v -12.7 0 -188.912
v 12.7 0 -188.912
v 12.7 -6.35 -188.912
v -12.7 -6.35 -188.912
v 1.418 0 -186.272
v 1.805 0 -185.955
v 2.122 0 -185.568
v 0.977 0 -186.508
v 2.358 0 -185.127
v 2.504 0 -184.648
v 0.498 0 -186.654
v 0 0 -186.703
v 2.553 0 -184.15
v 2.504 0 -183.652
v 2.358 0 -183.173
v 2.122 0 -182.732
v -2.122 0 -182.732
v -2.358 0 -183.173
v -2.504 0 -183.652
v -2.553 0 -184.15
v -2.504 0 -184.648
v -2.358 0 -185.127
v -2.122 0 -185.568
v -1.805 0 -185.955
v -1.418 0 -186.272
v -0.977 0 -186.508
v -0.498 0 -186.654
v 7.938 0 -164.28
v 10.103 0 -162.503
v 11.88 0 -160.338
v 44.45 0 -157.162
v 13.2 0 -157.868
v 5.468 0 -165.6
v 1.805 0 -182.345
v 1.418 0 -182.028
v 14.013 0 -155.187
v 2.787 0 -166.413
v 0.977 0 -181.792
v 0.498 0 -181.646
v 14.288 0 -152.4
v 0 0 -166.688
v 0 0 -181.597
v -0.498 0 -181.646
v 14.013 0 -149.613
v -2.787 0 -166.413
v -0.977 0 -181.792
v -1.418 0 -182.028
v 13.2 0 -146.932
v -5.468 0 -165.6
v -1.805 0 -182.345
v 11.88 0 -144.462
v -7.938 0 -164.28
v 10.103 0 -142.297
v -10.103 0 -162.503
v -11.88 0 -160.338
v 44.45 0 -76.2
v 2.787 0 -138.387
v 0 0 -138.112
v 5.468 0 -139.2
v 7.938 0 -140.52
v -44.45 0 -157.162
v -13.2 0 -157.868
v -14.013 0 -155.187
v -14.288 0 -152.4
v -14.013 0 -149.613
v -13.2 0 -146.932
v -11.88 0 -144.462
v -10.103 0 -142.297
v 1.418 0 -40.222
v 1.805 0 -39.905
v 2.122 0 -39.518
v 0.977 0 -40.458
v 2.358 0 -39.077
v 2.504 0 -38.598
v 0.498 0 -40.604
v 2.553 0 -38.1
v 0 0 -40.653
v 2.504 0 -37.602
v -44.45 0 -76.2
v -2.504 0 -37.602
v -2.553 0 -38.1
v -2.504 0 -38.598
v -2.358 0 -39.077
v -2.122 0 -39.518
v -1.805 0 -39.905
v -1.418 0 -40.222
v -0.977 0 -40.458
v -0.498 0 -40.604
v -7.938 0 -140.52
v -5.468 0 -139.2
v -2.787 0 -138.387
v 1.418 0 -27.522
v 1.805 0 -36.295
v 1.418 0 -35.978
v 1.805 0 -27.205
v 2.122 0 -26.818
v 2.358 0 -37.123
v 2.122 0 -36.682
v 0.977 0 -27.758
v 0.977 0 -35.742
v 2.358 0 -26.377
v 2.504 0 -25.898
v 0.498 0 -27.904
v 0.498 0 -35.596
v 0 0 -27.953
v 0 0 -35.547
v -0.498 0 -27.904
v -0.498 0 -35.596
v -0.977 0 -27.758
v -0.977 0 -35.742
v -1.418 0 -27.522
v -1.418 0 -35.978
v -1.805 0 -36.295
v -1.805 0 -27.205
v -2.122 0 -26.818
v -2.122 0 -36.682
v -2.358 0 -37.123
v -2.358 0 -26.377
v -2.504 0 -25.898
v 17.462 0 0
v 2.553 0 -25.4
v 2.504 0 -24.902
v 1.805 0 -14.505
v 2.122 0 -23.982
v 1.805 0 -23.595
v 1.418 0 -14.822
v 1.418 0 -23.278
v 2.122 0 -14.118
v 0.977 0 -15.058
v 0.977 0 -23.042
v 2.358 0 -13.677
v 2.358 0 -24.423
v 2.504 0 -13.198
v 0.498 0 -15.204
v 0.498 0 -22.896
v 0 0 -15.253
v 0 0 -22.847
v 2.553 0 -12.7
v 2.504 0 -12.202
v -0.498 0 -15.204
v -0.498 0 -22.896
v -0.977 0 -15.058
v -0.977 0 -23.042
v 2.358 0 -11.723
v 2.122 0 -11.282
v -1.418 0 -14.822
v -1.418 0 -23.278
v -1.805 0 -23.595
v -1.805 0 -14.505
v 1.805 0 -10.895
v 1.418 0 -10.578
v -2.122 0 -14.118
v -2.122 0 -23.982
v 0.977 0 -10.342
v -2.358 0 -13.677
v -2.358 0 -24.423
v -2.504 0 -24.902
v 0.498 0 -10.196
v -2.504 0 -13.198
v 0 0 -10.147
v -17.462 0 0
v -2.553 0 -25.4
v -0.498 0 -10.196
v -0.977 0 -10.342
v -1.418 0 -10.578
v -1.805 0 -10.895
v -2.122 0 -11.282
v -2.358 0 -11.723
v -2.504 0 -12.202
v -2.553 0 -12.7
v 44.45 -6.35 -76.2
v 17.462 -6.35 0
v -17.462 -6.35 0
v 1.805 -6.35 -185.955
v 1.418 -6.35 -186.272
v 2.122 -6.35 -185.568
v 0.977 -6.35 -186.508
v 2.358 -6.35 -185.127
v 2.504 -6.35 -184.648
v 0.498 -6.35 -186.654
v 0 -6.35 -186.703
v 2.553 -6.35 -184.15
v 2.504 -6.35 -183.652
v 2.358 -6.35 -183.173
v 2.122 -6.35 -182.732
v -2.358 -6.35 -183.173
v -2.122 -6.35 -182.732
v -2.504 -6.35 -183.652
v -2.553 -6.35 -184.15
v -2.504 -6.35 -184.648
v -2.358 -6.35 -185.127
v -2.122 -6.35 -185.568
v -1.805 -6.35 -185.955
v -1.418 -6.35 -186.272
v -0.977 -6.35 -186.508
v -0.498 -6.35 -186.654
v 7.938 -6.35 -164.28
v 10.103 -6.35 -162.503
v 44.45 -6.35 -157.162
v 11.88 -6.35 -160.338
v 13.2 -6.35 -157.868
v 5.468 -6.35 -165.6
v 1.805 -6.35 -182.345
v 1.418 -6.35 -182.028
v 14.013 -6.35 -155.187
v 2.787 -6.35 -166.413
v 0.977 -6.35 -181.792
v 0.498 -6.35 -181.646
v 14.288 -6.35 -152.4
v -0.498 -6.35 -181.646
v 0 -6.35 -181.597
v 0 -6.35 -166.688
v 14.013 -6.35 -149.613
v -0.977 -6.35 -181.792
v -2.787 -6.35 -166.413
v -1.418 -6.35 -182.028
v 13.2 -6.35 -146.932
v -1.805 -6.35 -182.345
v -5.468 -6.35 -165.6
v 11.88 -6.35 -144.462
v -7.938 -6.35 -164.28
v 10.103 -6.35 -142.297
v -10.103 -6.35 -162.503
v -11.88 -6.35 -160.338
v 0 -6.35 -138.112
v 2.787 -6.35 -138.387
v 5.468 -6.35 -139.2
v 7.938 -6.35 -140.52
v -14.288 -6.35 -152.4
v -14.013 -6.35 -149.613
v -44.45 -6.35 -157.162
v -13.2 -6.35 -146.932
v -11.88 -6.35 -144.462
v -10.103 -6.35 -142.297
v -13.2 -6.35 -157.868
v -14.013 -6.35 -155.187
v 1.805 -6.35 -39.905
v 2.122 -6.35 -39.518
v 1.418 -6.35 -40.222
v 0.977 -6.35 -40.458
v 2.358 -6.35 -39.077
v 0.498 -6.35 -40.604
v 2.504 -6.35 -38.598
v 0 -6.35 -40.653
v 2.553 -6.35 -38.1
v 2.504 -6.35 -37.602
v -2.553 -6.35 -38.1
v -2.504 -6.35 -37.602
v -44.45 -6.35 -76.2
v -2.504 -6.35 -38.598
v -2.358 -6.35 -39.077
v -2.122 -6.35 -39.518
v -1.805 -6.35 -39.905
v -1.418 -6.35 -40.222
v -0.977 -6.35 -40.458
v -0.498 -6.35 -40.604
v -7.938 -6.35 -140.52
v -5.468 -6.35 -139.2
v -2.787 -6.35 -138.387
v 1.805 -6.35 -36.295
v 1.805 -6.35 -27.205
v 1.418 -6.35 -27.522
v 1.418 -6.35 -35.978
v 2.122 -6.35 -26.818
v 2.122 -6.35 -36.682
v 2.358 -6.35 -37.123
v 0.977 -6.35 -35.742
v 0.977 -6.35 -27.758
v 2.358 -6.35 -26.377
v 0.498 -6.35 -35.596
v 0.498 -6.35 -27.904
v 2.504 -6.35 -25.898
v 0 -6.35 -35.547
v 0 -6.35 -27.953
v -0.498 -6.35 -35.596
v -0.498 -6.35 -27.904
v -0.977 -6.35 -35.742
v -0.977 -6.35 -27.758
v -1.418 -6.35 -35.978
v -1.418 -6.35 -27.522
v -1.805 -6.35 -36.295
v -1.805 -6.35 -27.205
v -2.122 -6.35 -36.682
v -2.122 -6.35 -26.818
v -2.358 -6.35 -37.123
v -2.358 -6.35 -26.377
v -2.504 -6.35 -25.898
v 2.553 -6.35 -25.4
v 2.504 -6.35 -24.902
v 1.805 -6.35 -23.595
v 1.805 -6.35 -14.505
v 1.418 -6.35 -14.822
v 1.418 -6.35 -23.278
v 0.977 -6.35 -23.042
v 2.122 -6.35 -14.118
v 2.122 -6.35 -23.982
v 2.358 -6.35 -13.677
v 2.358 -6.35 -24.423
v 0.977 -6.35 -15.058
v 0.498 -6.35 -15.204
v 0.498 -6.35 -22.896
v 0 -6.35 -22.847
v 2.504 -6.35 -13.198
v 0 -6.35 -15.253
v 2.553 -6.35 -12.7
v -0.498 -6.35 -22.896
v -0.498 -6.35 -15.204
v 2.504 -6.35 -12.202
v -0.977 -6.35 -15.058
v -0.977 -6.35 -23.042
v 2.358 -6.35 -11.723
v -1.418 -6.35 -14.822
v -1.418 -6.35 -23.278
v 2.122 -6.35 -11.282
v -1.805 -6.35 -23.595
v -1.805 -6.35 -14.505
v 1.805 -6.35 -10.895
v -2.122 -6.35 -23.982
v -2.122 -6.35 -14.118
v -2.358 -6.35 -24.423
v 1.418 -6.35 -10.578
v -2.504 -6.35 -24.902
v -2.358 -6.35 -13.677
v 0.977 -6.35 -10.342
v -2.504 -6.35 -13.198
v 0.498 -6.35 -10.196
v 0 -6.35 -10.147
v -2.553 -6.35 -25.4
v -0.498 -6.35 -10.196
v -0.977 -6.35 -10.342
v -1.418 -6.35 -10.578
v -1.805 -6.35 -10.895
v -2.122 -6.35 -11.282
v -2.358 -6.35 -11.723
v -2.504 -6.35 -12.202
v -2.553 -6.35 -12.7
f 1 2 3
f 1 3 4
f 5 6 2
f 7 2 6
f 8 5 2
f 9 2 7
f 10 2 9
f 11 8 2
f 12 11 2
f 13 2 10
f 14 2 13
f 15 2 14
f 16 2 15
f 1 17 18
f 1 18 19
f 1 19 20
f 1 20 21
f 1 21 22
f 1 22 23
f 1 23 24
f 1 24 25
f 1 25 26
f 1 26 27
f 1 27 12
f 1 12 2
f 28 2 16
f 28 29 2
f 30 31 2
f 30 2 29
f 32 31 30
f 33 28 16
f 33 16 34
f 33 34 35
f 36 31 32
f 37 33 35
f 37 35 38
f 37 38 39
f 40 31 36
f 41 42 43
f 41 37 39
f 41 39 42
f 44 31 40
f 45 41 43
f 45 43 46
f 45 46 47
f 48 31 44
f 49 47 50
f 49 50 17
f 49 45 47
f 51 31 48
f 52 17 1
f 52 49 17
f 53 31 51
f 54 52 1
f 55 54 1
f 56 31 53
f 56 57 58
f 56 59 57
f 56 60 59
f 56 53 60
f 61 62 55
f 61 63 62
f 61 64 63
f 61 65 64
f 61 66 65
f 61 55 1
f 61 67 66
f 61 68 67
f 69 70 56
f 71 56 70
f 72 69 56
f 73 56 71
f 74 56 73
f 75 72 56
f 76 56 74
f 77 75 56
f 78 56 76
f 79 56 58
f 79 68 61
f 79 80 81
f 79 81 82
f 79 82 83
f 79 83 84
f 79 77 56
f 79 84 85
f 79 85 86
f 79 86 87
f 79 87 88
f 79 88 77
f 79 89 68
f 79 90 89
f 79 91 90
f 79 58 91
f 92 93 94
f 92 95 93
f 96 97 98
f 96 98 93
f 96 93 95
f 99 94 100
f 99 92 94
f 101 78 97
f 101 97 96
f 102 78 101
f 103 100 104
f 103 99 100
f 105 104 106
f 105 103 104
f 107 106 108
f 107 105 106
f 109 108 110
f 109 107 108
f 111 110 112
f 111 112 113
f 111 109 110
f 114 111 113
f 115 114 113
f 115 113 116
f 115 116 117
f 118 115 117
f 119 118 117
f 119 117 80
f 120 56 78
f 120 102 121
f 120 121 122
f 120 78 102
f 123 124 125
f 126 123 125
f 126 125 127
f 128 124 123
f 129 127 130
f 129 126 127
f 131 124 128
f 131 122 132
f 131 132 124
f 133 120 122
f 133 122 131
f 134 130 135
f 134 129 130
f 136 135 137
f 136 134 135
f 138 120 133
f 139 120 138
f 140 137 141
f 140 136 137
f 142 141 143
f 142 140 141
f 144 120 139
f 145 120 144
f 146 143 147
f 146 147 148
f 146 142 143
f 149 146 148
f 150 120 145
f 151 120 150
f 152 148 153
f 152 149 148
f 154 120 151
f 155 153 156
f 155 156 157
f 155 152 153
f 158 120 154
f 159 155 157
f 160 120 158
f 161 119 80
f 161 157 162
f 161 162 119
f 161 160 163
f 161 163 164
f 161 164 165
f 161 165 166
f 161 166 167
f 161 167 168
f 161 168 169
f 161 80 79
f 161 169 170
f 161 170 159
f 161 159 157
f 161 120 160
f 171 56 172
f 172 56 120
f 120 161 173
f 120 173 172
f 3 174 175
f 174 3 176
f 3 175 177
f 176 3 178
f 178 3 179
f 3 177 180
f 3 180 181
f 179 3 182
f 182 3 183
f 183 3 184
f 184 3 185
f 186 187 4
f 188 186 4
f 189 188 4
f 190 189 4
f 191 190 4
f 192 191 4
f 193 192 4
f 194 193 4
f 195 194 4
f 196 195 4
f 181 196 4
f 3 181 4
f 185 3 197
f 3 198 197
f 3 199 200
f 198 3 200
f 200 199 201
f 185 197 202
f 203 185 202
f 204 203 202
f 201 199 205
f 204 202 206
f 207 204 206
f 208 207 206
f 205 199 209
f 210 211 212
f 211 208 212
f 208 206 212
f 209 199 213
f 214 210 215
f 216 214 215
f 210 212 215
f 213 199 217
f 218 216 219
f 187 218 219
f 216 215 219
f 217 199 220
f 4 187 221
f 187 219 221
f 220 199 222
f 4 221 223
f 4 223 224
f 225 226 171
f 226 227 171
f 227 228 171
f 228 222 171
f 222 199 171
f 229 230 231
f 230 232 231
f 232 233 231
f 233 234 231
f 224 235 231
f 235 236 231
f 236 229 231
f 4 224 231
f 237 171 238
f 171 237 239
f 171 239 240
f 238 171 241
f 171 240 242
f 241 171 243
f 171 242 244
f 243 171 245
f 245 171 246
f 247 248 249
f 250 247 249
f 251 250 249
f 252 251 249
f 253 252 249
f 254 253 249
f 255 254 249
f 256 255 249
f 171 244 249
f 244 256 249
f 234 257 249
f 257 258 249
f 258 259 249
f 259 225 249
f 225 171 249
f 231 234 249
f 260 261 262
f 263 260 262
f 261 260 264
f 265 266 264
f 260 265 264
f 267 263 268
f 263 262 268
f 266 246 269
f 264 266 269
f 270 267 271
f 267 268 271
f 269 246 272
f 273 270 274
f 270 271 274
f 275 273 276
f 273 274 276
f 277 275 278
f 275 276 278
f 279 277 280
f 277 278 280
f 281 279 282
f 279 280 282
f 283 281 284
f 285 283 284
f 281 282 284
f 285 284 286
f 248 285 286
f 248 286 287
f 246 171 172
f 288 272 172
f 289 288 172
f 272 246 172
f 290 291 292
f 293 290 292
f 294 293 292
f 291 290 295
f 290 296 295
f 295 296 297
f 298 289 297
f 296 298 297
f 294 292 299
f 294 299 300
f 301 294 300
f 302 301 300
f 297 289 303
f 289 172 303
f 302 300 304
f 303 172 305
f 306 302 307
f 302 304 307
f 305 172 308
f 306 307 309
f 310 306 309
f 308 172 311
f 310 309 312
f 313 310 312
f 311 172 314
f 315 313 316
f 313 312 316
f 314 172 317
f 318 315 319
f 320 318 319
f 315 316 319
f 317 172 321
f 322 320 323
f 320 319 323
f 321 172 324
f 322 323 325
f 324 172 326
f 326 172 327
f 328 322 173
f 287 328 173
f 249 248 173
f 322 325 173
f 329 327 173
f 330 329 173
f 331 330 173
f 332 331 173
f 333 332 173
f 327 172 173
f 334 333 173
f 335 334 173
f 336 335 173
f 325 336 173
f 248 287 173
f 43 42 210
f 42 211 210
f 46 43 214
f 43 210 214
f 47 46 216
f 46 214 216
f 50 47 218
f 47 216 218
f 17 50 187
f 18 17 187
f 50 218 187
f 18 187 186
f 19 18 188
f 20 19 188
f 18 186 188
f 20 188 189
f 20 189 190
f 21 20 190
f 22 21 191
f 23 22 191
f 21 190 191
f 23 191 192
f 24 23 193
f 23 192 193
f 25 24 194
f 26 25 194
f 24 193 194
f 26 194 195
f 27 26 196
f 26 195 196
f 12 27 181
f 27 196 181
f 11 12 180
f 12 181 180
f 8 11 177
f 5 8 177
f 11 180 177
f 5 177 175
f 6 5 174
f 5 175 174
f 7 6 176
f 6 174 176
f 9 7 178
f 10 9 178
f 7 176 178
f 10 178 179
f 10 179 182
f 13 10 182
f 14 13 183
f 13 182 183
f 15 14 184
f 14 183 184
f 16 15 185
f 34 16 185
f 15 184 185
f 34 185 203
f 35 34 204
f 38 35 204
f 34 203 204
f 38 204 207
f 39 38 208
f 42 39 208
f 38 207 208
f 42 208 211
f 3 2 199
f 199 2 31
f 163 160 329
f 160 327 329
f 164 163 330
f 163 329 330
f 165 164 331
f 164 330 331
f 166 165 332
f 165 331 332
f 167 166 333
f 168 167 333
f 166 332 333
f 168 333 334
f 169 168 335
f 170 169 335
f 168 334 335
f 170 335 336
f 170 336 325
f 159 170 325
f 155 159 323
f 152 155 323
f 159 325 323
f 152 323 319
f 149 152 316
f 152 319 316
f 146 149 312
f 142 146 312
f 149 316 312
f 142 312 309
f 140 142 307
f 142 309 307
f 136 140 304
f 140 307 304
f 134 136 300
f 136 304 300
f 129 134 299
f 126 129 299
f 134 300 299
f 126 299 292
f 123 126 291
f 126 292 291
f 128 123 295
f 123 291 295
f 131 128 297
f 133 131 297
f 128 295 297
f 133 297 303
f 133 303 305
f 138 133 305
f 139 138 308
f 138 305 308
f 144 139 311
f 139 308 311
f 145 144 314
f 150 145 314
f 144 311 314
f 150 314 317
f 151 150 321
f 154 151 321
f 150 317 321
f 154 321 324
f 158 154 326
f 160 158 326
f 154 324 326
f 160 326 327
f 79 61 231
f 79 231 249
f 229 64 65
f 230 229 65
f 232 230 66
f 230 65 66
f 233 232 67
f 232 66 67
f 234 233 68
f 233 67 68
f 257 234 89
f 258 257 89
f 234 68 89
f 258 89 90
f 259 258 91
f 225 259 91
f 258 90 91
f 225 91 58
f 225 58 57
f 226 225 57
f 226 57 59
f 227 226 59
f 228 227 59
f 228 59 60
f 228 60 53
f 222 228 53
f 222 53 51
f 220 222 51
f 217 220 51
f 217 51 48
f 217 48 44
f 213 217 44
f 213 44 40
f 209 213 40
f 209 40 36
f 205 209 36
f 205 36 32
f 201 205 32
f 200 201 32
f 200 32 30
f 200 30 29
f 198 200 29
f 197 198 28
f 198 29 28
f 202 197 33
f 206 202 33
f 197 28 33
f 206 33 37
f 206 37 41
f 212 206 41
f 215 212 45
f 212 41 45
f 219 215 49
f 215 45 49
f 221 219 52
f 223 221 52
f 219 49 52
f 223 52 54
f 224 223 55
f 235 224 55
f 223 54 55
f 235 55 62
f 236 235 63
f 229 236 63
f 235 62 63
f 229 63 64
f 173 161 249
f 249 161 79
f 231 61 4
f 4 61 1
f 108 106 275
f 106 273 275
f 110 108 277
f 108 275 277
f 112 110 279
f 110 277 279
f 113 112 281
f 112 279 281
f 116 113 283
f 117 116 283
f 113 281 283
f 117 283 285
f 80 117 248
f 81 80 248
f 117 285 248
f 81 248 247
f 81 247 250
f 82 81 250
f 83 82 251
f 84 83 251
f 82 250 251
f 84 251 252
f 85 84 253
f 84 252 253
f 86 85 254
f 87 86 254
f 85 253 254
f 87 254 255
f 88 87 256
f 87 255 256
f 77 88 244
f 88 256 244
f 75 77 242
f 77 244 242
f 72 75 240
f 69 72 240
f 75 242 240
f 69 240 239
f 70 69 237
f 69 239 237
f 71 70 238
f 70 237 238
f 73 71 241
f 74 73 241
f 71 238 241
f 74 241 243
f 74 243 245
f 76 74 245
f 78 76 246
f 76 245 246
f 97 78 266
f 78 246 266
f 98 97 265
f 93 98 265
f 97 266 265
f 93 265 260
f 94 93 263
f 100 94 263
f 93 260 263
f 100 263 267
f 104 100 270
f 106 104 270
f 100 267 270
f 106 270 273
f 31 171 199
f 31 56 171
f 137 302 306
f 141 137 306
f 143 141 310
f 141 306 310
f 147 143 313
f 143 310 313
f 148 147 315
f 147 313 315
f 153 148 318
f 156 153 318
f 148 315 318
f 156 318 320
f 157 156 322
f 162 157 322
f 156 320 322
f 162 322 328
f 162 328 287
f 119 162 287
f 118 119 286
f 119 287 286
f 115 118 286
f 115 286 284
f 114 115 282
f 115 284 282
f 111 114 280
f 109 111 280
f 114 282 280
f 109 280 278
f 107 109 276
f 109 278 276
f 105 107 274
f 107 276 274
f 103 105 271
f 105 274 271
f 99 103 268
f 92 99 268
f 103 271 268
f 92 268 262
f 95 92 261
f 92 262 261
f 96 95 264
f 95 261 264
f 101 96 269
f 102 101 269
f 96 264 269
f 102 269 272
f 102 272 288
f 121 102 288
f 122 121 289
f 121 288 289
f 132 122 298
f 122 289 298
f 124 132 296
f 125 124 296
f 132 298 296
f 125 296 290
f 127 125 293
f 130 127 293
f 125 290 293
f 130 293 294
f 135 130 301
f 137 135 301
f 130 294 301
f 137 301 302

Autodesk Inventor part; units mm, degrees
ref_plane "YZ Plane" through (0, 0, 0) normal (1, 0, 0) x (0, 1, 0)
ref_plane "XZ Plane" through (0, 0, 0) normal (0, 1, 0) x (-1, 0, 0)
ref_plane "XY Plane" through (0, 0, 0) normal (0, 0, 1) x (1, 0, 0)
sketch "Sketch1" plane through (0, 0, 0) normal (0, 1, 0) x (-1, 0, 0)
  line L0 (44.45, 0) -> (-44.45, 0)
  line L1 (-44.45, 0) -> (-44.45, -188.9125)
  line L2 (-44.45, -188.9125) -> (44.45, -188.9125)
  line L3 (44.45, -188.9125) -> (44.45, 0)
  line L4 (12.7, -50.8) -> (-12.7, -50.8) construction
  line L5 (-12.7, -50.8) -> (-12.7, 0) construction
  line L6 (-12.7, 0) -> (12.7, 0) construction
  line L7 (12.7, 0) -> (12.7, -50.8) construction
  circle A0 centre (0, -152.4) radius 14.2875
  circle A1 centre (0, -184.15) radius 4.7625 construction
  point P0 (0, 0)
  point P1 (0, 0)
  dimension "d0" = 50.8
  dimension "d1" = 25.4
  dimension "d2" = 88.9
  dimension "d4" = 28.575
  dimension "d5" = 9.525
  dimension "d6" = 31.75
  dimension "d7" = 152.4
extrude "Extrusion1" add sketch "Sketch1" against normal blind 6.35
hole "Hole1" at (0, 0, -184.15) direction (0, -1, 0) diameter 5.1054 end through all clearance for "Flat Head Machine Screw (82)" size "#10" standard "Ansi Unified Screw Threads"
sketch "Sketch2" plane through (0, 0, 0) normal (0, 1, 0) x (1, 0, 0)
  circle A0 centre (0, 184.15) radius 2.5527 construction
  circle A1 centre (0, 152.4) radius 14.2875 construction
  line L0 (-44.45, 188.9125) -> (44.45, 188.9125) construction
  line L1 (44.45, 188.9125) -> (44.45, 0) construction
  line L2 (44.45, 0) -> (-44.45, 0) construction
  line L3 (-44.45, 0) -> (-44.45, 188.9125) construction
  line L4 (-44.45, 188.9125) -> (-44.45, 0) construction
  line L5 (-44.45, 157.1625) -> (-12.7, 188.9125)
  line L6 (44.45, 188.9125) -> (-44.45, 188.9125) construction
  line L7 (-12.7, 188.9125) -> (-44.45, 188.9125)
  line L8 (-44.45, 157.1625) -> (-44.45, 188.9125)
  line L9 (44.45, 188.9125) -> (12.7, 188.9125)
  line L10 (12.7, 188.9125) -> (44.45, 157.1625)
  line L11 (44.45, 157.1625) -> (44.45, 188.9125)
  line L12 (44.45, 0) -> (44.45, 188.9125) construction
  line L13 (-12.7, 188.9125) -> (12.7, 188.9125) construction
  line L14 (-44.45, 0) -> (-17.4625, 0)
  line L15 (-17.4625, 0) -> (-44.45, 76.2)
  line L16 (-44.45, 76.2) -> (-44.45, 0)
  line L17 (17.4625, 0) -> (44.45, 0)
  line L18 (44.45, 0) -> (44.45, 76.2)
  line L19 (44.45, 76.2) -> (17.4625, 0)
  line L20 (-44.45, 0) -> (44.45, 0) construction
  line L21 (-12.7, 0) -> (12.7, 0) construction
  line L22 (12.7, 0) -> (12.7, 50.8) construction
  line L23 (12.7, 50.8) -> (-12.7, 50.8) construction
  line L24 (-12.7, 50.8) -> (-12.7, 0) construction
  line L25 (17.4625, 0) -> (-17.4625, 0) construction
  point P0 (0, 0)
  point P1 (0, 188.9125)
  point P2 (0, 50.8)
  point P3 (0, 0)
  point P4 (0, 0)
  point P5 (0, 0)
  point P6 (0, 0)
  dimension "d18" = 25.4
  dimension "d19" = 31.75
  dimension "d20" = 31.75
  dimension "d21" = 25.4
  dimension "d22" = 50.8
  dimension "d23" = 34.925
  dimension "d24" = 76.2
extrude "Extrusion2" cut sketch "Sketch2" against normal through all
sketch "Sketch3" plane through (0, 0, 0) normal (0, 1, 0) x (1, 0, 0)
  line L0 (-17.4625, 0) -> (17.4625, 0) construction
  line L1 (0, 12.7) -> (0, 38.1) construction
  point P0 (0, 0)
  point P1 (0, 25.4)
  point P2 (0, 0)
  point P3 (0, 0)
  point P4 (0, 25.4)
  dimension "d27" = 12.7
  dimension "d28" = 25.4
hole "Hole2" at (0, 0, -12.7) at (0, 0, -25.4) at (0, 0, -38.1) direction (0, -1, 0) diameter 5.1054 end through all clearance for "Flat Head Machine Screw (82)" size "#10" standard "Ansi Unified Screw Threads"
equation "\"d20\" = d19"
properties part number "CL4-002" material "Aluminum 6061"
